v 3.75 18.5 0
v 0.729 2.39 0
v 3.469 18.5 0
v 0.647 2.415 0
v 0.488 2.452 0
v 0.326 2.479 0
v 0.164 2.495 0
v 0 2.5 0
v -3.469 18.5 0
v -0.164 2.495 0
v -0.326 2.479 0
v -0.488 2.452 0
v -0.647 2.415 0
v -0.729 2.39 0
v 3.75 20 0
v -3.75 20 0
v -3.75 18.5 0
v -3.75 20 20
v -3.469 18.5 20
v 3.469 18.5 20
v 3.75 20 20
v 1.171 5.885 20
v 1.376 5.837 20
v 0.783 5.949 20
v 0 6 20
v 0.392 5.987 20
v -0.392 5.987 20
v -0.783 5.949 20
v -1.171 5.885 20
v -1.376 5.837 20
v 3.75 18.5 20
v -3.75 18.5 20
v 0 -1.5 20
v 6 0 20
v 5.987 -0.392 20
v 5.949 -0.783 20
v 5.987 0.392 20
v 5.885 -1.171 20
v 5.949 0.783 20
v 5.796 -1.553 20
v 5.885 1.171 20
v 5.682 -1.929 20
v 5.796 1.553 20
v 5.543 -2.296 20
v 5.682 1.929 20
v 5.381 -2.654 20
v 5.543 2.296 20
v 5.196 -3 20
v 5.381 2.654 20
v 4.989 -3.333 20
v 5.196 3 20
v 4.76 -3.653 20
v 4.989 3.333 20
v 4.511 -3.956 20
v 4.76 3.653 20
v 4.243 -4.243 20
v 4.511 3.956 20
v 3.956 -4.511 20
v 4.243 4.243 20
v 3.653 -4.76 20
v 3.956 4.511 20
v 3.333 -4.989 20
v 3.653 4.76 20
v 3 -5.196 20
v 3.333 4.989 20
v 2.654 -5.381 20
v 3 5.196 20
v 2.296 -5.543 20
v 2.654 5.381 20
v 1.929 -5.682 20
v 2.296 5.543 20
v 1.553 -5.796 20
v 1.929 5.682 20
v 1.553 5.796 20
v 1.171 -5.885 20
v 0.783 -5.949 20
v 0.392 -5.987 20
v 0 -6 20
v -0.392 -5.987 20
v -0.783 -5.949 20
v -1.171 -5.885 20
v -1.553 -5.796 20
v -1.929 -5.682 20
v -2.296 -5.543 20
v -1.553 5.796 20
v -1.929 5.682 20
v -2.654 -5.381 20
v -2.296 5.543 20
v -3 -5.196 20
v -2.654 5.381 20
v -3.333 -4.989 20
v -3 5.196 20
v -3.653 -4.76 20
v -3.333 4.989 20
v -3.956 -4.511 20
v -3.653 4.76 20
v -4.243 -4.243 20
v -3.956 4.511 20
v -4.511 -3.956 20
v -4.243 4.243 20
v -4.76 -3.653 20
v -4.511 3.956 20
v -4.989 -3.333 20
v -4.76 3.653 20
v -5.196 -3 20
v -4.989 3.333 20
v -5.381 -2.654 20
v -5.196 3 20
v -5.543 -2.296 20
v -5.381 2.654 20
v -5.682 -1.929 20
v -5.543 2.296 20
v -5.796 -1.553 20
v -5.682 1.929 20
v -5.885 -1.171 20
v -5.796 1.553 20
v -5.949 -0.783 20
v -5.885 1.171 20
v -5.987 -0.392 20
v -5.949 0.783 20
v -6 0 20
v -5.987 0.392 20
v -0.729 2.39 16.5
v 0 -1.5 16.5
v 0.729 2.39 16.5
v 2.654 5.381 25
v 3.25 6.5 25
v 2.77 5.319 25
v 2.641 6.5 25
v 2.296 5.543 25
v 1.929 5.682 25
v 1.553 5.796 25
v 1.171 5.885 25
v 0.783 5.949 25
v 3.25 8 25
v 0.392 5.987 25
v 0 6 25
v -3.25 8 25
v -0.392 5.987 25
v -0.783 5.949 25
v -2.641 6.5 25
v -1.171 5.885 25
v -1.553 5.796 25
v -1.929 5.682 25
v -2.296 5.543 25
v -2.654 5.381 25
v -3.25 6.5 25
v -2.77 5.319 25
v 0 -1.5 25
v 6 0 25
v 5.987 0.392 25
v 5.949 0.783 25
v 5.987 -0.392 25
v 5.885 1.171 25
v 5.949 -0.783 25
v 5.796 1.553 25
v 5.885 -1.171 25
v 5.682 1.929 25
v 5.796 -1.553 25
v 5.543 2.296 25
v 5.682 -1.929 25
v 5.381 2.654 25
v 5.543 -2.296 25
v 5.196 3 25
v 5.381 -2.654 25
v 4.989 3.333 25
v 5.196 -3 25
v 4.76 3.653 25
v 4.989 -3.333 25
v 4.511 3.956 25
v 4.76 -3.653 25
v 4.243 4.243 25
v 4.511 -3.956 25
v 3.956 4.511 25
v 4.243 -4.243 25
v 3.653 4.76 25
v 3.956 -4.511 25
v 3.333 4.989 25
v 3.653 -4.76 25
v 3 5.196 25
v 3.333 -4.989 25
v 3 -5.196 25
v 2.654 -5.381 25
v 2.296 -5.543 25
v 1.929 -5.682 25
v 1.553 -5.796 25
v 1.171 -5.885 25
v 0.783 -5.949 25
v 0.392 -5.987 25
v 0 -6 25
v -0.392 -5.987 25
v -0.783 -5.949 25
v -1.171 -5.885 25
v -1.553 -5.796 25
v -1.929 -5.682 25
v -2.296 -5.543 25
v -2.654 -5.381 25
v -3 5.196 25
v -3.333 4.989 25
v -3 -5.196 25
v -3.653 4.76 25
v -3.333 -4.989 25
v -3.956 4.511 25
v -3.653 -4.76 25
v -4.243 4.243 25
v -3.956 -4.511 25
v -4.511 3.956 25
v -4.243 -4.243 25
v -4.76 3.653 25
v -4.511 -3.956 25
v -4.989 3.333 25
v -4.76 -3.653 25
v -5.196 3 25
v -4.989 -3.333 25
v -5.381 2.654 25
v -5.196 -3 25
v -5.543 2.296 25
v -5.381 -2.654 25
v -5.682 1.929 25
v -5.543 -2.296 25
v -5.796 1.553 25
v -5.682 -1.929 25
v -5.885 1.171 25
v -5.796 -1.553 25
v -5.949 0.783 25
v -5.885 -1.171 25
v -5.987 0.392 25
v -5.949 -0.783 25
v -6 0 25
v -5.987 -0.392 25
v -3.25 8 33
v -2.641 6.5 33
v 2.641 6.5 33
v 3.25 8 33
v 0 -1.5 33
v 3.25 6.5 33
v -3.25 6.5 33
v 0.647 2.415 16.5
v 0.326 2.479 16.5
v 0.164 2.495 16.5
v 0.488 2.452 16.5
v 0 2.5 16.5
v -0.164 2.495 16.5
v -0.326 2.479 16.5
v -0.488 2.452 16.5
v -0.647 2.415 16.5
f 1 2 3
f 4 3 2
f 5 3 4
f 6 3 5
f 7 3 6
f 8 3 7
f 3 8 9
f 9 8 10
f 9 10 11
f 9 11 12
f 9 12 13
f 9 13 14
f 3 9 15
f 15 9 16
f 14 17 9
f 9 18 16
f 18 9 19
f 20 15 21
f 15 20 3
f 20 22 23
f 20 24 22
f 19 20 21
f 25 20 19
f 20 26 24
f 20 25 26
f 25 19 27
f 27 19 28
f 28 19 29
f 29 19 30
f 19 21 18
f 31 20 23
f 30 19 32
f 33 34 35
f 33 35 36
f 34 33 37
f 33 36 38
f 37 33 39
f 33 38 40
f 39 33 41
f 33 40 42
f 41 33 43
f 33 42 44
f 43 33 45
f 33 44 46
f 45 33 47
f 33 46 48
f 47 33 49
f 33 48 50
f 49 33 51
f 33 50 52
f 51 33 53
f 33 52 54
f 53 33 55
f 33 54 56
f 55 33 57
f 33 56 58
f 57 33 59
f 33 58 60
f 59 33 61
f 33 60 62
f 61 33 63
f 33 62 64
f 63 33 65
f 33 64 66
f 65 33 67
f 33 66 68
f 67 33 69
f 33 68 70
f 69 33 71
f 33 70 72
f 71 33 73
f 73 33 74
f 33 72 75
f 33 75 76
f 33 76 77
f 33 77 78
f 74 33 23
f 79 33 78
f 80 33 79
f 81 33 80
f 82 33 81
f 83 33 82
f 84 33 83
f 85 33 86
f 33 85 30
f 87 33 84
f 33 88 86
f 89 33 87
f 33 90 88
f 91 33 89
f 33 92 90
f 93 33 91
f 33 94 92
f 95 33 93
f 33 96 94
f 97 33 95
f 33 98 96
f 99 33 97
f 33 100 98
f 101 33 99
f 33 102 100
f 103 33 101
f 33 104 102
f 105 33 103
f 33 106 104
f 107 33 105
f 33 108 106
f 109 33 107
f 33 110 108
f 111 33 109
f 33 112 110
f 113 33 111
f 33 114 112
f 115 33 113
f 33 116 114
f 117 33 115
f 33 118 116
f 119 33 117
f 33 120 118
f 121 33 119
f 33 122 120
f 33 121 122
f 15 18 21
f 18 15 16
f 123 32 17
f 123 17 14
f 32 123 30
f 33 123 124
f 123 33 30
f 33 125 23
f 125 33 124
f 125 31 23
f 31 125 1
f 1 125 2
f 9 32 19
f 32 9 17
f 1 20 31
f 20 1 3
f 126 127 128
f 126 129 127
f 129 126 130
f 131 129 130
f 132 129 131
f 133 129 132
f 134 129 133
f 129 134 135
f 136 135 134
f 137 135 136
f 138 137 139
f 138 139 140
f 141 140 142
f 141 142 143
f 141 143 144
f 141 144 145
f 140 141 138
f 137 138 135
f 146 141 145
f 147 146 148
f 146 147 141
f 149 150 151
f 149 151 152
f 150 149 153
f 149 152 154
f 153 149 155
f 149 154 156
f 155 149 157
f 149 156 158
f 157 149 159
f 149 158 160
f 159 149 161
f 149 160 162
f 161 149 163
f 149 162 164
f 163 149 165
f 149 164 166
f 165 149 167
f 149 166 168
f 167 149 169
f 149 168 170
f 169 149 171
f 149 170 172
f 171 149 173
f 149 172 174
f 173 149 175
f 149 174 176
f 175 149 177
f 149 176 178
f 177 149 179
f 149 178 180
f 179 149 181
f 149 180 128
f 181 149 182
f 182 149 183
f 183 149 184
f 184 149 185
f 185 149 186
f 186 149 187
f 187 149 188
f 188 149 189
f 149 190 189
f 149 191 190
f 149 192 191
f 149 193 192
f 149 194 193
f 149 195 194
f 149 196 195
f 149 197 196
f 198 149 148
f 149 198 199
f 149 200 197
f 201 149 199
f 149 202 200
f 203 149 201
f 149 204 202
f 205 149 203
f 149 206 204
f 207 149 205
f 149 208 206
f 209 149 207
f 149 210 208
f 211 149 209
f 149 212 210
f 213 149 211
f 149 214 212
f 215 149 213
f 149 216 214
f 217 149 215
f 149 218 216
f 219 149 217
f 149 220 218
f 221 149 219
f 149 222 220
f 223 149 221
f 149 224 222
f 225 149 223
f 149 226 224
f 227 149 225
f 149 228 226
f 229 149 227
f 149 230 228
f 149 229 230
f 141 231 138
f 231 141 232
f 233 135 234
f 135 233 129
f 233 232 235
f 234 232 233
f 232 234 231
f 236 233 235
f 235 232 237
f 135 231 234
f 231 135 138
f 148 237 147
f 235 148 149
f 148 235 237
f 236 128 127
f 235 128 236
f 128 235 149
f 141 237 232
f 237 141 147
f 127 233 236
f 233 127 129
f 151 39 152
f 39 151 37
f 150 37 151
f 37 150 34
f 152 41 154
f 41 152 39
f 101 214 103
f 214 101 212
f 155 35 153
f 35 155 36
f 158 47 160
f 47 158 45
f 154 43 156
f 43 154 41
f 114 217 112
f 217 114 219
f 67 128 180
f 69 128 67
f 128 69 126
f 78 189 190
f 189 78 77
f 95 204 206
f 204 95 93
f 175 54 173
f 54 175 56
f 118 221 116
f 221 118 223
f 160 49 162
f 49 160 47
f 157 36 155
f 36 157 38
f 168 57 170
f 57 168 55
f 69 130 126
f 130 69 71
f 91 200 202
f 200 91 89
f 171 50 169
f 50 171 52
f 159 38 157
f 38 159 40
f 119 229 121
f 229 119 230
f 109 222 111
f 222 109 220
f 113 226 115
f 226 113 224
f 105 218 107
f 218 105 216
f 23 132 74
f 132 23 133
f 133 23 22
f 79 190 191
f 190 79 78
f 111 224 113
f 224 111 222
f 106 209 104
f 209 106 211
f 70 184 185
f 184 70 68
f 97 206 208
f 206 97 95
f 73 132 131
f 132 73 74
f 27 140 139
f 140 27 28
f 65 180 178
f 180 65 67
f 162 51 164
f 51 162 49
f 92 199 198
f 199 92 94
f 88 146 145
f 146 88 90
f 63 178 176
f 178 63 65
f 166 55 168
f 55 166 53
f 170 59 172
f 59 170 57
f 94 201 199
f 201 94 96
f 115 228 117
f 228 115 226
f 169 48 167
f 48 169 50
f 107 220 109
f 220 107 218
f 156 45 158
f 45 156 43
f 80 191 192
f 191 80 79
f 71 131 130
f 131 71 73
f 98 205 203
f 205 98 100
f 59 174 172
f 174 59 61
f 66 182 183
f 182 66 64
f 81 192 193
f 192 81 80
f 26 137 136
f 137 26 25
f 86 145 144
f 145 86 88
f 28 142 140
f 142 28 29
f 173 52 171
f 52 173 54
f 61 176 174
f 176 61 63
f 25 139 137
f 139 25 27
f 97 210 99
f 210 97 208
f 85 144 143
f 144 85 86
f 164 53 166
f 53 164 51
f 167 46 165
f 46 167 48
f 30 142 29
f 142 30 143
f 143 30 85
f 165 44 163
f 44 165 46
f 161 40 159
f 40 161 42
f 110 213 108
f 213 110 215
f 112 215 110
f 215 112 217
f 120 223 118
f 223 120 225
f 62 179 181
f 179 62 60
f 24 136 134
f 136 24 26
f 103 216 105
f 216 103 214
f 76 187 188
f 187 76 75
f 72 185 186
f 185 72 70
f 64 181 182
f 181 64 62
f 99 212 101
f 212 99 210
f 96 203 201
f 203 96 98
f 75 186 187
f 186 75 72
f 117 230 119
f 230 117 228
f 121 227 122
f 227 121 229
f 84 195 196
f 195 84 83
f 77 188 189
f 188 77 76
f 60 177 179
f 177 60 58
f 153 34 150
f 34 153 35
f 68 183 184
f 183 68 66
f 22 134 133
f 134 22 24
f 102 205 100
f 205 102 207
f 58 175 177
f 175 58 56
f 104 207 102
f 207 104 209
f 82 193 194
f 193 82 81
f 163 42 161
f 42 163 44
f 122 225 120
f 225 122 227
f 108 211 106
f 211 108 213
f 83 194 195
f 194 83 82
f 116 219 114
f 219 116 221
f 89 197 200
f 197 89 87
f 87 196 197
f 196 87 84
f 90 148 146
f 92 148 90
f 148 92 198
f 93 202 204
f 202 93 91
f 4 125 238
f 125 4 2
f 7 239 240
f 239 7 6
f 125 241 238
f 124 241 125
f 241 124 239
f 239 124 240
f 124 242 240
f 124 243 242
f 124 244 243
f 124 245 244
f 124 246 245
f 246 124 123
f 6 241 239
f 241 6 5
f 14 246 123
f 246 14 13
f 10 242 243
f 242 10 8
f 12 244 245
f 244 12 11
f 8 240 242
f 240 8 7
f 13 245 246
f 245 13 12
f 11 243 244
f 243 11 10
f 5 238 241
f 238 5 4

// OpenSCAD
// Hose-barb reducer: 8 mm tubing (z = 0..20) -> collar (z = 20..25) -> 5 mm tubing (z = 25..41)
// Print orientation: standing upright along +Z, centred on the origin in X/Y.

// ---------------- Parameters ----------------
reducer_in     = 8;    // 8 mm tubing inner diameter (mm)
reducer_in_h   = 20;   // height of 8 mm tubing barbs (mm)
reducer_in_od  = 7.5;  // outer diameter of 8 mm barbs at bottom (mm)
reducer_in_od2 = 9.5;  // outer diameter of 8 mm barbs at top (mm)

reducer_coll   = 12;   // collar diameter (mm)
reducer_coll_h = 5;    // collar height (mm)

reducer_out    = 5;    // 5 mm tubing inner diameter (mm)
reducer_out_h  = 8;    // height of 5 mm tubing barbs (mm)
reducer_out_od = 6.5;  // outer diameter of 5 mm barbs at bottom (mm)
reducer_out_od2 = 5.0; // outer diameter of 5 mm barbs at top (mm)

eps = 0.5;             // overshoot for clean boolean cuts (mm)

$fn = 96;              // curve resolution

// ---------------- Derived ----------------
total_h = reducer_in_h + reducer_coll_h + reducer_out_h;   // 33 mm
pitch   = 1.5;                                             // barb-to-barb spacing (mm)

// ---------------- Model ----------------
difference() {
    union() {
        // 8 mm tubing barbs (z = 0..20)
        for (i = [0 : 1])
            translate([0, -pitch * i, 0])
                linear_extrude(height = reducer_in_h)
                    polygon([
                        [0, 0],
                        [reducer_in_od / 2, reducer_in_h],
                        [-reducer_in_od / 2, reducer_in_h]
                    ]);

        // Collar (z = 20..25)
        translate([0, 0, reducer_in_h])
            cylinder(d = reducer_coll, h = reducer_coll_h);

        // 5 mm tubing barbs (z = 25..33)
        for (i = [0 : 1])
            translate([0, -pitch * i, reducer_in_h + reducer_coll_h])
                linear_extrude(height = reducer_out_h)
                    polygon([
                        [0, 0],
                        [reducer_out_od / 2, reducer_out_h],
                        [-reducer_out_od / 2, reducer_out_h]
                    ]);
    }

    // Through bore (full length)
    translate([0, 0, -eps])
        linear_extrude(height = total_h + 2 * eps, center = true)
            circle(d = reducer_in < reducer_out ? reducer_in : reducer_out);
}
